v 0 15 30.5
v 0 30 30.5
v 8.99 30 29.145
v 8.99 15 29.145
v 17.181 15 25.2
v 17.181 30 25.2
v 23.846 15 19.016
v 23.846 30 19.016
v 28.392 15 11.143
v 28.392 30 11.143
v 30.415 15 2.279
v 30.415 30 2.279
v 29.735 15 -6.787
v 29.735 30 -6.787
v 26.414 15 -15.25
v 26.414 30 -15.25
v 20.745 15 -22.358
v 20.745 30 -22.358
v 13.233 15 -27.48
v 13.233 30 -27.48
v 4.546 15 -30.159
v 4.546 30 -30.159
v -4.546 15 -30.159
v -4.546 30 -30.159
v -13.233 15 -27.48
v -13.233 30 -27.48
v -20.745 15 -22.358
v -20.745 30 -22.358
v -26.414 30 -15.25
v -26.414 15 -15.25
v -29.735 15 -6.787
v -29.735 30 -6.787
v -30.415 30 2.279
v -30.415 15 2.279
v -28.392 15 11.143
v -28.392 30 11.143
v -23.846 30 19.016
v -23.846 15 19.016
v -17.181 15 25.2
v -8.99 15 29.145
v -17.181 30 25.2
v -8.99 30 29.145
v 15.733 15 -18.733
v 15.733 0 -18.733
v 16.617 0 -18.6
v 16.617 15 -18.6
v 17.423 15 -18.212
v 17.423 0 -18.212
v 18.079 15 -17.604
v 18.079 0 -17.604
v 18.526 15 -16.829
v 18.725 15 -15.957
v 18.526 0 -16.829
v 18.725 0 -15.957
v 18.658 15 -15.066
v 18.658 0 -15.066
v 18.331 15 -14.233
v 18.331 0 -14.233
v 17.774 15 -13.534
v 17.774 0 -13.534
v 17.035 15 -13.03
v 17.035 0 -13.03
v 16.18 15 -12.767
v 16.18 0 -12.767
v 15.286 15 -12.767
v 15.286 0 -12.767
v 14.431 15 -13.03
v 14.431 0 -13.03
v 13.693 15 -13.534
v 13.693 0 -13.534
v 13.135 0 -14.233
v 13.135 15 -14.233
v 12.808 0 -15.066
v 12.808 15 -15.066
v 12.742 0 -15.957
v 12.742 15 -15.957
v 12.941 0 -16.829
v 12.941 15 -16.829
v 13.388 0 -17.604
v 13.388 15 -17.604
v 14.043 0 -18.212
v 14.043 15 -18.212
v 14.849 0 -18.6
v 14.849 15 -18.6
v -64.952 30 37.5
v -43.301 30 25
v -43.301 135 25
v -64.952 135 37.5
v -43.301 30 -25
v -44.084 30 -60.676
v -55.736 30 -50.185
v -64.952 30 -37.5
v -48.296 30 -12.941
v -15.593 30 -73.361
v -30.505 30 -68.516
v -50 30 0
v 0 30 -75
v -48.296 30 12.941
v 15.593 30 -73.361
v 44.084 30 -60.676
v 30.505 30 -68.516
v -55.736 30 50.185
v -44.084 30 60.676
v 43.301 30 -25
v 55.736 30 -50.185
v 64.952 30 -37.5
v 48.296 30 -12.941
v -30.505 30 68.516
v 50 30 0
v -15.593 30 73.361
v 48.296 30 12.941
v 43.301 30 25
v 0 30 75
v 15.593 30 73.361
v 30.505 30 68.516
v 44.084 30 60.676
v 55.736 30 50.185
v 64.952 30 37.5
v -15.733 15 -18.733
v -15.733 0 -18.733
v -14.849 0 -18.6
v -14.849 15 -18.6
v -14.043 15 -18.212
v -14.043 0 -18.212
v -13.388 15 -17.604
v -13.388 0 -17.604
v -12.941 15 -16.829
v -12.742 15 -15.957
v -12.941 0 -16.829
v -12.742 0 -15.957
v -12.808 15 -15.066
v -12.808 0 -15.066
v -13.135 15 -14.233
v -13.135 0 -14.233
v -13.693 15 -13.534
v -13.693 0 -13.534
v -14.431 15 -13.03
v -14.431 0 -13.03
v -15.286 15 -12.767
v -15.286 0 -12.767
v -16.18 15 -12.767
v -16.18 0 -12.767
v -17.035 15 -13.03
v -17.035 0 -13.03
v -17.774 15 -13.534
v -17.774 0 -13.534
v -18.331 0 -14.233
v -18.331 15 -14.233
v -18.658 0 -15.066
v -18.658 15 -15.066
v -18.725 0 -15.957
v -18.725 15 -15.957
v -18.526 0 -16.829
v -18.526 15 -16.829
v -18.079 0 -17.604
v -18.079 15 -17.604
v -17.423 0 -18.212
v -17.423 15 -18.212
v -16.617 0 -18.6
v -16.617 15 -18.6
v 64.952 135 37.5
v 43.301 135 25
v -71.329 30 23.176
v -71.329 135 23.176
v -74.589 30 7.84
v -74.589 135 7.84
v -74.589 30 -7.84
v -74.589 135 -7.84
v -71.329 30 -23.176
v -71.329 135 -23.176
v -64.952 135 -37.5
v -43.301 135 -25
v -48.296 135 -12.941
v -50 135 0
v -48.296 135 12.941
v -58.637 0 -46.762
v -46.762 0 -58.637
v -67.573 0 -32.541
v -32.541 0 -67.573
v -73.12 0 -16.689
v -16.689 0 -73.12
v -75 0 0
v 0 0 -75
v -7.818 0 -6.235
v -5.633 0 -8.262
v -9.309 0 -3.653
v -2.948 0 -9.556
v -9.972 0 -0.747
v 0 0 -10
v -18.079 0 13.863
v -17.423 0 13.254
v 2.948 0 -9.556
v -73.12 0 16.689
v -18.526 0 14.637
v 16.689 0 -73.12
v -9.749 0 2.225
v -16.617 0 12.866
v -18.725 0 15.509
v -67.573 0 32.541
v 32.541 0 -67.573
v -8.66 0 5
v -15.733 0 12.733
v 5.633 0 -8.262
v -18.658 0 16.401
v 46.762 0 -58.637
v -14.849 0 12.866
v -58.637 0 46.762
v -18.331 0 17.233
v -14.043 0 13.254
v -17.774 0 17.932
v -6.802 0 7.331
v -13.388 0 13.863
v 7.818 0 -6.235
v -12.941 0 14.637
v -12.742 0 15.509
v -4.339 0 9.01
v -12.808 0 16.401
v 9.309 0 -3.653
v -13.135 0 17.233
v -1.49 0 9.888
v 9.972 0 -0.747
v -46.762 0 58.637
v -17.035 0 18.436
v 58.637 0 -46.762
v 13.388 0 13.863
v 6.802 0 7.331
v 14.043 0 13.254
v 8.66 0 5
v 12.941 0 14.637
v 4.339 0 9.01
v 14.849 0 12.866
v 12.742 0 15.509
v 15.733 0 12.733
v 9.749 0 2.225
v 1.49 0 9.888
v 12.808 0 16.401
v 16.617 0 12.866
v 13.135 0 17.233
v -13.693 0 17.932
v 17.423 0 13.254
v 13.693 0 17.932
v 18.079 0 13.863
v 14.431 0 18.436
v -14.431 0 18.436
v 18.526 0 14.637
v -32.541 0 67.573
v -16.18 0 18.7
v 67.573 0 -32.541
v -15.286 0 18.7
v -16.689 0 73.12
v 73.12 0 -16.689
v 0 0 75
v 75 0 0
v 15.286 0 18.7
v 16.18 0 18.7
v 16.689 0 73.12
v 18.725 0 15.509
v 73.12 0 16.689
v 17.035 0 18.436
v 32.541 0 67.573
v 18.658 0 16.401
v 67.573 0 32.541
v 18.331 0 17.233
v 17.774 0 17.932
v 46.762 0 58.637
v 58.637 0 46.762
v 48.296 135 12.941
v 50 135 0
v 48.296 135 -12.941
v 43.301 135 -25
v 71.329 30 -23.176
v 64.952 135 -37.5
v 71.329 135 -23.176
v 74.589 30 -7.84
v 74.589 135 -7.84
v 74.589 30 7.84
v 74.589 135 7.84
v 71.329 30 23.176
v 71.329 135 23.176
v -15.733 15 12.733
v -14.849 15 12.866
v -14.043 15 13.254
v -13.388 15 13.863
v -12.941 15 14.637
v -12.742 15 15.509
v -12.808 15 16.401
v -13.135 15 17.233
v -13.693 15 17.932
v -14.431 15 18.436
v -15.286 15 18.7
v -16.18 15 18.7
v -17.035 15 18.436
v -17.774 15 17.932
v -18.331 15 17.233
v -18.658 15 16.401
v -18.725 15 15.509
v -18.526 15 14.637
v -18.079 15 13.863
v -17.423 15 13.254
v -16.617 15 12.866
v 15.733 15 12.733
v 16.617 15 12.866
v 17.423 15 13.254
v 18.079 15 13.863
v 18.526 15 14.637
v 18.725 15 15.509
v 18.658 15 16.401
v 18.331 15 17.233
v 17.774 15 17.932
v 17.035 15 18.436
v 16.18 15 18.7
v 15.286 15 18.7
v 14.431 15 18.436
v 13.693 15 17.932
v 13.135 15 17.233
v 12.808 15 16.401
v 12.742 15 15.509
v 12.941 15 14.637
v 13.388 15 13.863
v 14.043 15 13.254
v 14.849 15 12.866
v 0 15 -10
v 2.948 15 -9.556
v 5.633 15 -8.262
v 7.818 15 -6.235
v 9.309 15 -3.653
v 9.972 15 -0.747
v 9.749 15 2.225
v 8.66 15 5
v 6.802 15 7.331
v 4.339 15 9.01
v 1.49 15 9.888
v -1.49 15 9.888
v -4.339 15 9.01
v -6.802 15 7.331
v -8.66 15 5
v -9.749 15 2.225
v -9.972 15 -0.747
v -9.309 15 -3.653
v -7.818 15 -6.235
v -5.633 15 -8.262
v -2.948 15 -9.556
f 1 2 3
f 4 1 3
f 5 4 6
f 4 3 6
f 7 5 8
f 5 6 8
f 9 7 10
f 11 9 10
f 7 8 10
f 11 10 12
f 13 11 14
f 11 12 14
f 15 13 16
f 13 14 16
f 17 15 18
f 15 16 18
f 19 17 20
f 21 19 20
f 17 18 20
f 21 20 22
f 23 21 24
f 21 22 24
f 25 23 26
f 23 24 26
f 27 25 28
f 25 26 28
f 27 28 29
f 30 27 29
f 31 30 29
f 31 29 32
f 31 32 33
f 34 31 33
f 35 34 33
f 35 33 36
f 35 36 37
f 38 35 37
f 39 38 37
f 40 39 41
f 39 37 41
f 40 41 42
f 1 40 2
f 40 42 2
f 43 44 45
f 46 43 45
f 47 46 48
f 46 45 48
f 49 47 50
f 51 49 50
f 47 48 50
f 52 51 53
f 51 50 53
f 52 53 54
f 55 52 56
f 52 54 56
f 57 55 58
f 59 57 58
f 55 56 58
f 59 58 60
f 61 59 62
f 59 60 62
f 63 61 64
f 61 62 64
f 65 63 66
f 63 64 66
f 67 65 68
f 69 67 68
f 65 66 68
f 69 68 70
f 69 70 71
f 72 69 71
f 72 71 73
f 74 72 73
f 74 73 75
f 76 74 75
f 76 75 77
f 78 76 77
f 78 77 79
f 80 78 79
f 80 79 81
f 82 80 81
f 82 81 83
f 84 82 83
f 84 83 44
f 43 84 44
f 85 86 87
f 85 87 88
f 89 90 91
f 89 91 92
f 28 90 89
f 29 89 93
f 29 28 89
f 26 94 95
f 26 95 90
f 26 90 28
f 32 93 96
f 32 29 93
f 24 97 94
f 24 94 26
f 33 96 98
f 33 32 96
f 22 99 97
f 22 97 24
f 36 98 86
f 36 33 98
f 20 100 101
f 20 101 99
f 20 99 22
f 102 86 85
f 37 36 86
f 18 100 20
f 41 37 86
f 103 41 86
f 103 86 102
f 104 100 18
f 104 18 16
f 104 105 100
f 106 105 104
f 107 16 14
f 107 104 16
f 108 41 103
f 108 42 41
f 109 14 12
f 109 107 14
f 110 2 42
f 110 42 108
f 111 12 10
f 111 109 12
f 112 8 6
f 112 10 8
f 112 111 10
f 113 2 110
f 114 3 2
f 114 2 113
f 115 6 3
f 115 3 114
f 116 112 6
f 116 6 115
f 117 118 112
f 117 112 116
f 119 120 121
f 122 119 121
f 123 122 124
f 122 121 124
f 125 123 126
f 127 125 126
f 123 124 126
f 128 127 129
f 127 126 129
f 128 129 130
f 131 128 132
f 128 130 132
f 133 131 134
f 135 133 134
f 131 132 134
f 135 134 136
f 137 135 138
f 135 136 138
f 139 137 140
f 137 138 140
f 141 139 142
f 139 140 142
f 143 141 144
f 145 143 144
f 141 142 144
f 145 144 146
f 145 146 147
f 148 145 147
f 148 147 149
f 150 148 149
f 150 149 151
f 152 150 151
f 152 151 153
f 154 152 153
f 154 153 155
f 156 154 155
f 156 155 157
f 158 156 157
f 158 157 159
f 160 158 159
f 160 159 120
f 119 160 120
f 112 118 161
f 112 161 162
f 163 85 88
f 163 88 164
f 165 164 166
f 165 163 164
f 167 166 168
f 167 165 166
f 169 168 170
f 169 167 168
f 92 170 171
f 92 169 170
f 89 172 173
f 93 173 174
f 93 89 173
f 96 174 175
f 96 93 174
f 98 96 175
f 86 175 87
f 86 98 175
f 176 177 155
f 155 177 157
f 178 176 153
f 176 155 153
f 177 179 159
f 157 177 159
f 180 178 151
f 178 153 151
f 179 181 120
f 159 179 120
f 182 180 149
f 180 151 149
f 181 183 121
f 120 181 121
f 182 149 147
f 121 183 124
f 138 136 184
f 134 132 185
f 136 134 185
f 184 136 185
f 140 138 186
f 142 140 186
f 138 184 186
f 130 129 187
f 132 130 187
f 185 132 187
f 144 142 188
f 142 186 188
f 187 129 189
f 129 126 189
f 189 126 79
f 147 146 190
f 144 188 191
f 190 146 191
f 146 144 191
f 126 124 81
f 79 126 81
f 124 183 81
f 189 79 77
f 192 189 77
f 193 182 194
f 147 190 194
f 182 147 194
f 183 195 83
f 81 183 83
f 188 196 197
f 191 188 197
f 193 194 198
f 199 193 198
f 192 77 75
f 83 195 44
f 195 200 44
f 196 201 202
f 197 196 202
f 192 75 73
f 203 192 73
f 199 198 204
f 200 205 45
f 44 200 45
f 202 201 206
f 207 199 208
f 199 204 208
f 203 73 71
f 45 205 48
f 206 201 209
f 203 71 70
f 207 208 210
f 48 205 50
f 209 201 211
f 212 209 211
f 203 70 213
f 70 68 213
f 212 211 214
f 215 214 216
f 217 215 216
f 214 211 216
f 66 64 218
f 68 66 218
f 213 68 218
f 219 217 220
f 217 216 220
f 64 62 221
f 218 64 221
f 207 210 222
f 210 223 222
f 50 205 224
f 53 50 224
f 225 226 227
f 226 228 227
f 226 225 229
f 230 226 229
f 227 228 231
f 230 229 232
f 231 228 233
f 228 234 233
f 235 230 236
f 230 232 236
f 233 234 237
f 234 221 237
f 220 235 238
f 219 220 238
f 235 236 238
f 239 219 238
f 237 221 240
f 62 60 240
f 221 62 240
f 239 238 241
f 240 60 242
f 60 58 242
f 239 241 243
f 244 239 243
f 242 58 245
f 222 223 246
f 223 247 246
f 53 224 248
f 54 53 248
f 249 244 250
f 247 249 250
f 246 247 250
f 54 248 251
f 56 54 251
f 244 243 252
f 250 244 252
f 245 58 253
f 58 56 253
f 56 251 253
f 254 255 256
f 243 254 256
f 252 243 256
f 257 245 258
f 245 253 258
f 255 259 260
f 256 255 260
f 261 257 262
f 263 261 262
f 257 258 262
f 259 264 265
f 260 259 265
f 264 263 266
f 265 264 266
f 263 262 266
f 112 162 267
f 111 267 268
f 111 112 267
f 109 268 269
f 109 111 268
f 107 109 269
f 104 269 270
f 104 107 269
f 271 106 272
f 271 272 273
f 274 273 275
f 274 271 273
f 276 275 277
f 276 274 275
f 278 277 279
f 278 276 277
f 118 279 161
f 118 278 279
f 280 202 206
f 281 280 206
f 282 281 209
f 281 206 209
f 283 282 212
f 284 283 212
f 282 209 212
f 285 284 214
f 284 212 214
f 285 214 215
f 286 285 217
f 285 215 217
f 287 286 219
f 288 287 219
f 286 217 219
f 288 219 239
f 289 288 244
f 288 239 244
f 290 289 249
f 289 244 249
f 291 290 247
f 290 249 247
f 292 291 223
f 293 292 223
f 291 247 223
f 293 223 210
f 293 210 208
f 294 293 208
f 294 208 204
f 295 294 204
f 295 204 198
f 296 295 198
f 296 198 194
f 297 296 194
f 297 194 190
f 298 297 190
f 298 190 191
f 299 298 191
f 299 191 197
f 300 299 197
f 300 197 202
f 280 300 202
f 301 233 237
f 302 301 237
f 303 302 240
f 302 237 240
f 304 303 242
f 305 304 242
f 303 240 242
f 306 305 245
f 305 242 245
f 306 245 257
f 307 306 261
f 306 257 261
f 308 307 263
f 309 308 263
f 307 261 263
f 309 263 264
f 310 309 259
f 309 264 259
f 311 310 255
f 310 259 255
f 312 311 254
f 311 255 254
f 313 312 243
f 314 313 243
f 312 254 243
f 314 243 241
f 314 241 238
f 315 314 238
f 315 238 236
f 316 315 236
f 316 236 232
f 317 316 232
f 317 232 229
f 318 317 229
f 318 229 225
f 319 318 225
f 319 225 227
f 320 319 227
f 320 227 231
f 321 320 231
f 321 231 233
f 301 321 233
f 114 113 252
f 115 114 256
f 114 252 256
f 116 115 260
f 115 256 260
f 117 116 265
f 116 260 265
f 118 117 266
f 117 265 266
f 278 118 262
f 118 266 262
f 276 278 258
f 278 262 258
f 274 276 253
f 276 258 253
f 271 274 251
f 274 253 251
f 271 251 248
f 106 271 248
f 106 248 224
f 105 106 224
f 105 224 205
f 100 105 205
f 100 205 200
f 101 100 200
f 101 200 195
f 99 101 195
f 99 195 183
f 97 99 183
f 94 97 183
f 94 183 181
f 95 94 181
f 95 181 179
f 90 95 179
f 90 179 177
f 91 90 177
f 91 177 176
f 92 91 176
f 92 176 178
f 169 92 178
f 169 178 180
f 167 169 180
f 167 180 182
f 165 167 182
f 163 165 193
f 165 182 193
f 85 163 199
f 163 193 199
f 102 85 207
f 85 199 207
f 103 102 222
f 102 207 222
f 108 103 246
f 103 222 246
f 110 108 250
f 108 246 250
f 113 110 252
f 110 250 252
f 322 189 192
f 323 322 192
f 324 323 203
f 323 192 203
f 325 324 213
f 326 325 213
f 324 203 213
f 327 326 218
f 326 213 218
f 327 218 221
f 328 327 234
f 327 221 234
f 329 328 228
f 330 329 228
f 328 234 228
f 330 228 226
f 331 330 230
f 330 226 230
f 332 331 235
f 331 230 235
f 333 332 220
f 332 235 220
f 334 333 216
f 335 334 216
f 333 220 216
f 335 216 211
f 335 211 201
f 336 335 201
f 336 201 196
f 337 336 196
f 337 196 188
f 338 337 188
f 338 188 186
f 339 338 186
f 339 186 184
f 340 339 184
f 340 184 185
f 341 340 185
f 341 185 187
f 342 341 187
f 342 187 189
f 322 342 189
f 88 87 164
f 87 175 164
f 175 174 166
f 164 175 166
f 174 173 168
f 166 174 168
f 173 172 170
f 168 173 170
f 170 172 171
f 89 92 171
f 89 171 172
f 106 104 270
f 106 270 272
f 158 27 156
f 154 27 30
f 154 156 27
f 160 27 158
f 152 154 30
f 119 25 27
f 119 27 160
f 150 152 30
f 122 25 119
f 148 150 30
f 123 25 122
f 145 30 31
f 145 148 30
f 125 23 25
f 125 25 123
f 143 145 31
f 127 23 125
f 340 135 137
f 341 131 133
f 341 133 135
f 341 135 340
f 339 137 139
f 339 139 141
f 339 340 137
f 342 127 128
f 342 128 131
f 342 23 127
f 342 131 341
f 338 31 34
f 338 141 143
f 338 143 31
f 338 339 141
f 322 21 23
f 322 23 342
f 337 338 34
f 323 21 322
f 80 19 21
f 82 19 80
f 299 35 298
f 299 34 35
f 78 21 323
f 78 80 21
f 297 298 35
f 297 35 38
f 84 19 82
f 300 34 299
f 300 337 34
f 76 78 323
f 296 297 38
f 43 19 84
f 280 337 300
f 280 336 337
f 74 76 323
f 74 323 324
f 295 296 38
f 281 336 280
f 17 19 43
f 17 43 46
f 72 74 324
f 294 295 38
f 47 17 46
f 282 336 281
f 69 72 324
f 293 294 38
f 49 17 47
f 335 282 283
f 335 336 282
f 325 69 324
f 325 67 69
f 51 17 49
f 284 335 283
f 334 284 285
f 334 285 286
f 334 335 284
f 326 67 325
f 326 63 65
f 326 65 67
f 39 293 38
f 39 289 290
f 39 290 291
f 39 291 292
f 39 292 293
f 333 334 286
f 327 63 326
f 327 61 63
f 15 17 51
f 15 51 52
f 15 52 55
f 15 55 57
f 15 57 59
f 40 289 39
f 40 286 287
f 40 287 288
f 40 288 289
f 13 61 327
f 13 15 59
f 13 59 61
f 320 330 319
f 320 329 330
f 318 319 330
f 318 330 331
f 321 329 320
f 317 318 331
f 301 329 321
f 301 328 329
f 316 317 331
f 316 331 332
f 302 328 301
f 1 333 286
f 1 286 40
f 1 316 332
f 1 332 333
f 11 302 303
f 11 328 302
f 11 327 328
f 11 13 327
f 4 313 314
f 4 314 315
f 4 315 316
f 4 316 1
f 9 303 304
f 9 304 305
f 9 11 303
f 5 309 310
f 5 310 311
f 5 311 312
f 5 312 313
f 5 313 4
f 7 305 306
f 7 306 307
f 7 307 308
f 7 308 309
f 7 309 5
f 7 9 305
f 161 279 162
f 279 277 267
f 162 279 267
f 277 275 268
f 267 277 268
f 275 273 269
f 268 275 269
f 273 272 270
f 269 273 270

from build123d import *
from build123d.topology import SkipClean

# Parameters (mm, degrees)
SKETCH1_R           = 75
BOSS_EXTRUDE1_DEPTH = 30
SKETCH2_R           = 30.5
CUT_EXTRUDE1_DEPTH  = 15
BOSS_EXTRUDE2_DEPTH = 105
SKETCH4_R           = 10
CUT_EXTRUDE2_DEPTH  = 105
SKETCH5_R           = 3
CUT_EXTRUDE3_DEPTH  = 105


with BuildPart() as part:
    # Sketch1 → Boss-Extrude1 (new body)
    with BuildSketch(Plane(origin=(0, 0, 0), x_dir=(1, 0, 0), z_dir=(0, 1, 0))):
        with Locations(Location((0, 0, 0), (0, 0, 270))):
            Circle(SKETCH1_R)
    extrude(amount=BOSS_EXTRUDE1_DEPTH)

    # Sketch2 → Cut-Extrude1 (cut)
    with BuildSketch(Plane(origin=(0, 30, 0), x_dir=(1, 0, 0), z_dir=(0, 1, 0))):
        with Locations(Location((0, 0, 0), (0, 0, 270))):
            Circle(SKETCH2_R)
    extrude(amount=-CUT_EXTRUDE1_DEPTH, mode=Mode.SUBTRACT)

    # Sketch3 → Boss-Extrude2 (add)
    with SkipClean():  # the faces are left unmerged after this step: merging them gives an invalid solid
        with BuildSketch(Plane(origin=(0, 30, 0), x_dir=(1, 0, 0), z_dir=(0, 1, 0))):
            with BuildLine():
                Line((43.301270189, 25), (64.951905284, 37.5))
                ThreePointArc((64.951905284, 37.5), (75, 0), (64.951905284, -37.5))
                Line((64.951905284, -37.5), (43.301270189, -25))
                ThreePointArc((43.301270189, -25), (50, 0), (43.301270189, 25))
            make_face()
            with BuildLine():
                Line((-43.301270189, -25), (-64.951905284, -37.5))
                ThreePointArc((-64.951905284, -37.5), (-75, 0), (-64.951905284, 37.5))
                Line((-64.951905284, 37.5), (-43.301270189, 25))
                ThreePointArc((-43.301270189, 25), (-50, 0), (-43.301270189, -25))
            make_face()
        extrude(amount=BOSS_EXTRUDE2_DEPTH)

    # Sketch4 → Cut-Extrude2 (cut)
    with SkipClean():  # the faces are left unmerged after this step: merging them gives an invalid solid
        with BuildSketch(Plane.XZ):
            with Locations(Location((0, 0, 0), (0, 0, 270))):
                Circle(SKETCH4_R)
        extrude(amount=-CUT_EXTRUDE2_DEPTH, mode=Mode.SUBTRACT)

    # Sketch5 → Cut-Extrude3 (cut)
    with SkipClean():  # the faces are left unmerged after this step: merging them gives an invalid solid
        with BuildSketch(Plane.XZ):
            with Locations(Location((-15.733125881, 15.733125881, 0), (0, 0, 270))):
                Circle(SKETCH5_R)
            with Locations(Location((15.733125881, 15.733125881, 0), (0, 0, 270))):
                Circle(SKETCH5_R)
            with Locations(Location((15.733125881, -15.733125881, 0), (0, 0, 270))):
                Circle(SKETCH5_R)
            with Locations(Location((-15.733125881, -15.733125881, 0), (0, 0, 270))):
                Circle(SKETCH5_R)
        extrude(amount=-CUT_EXTRUDE3_DEPTH, mode=Mode.SUBTRACT)


solid = part.part
